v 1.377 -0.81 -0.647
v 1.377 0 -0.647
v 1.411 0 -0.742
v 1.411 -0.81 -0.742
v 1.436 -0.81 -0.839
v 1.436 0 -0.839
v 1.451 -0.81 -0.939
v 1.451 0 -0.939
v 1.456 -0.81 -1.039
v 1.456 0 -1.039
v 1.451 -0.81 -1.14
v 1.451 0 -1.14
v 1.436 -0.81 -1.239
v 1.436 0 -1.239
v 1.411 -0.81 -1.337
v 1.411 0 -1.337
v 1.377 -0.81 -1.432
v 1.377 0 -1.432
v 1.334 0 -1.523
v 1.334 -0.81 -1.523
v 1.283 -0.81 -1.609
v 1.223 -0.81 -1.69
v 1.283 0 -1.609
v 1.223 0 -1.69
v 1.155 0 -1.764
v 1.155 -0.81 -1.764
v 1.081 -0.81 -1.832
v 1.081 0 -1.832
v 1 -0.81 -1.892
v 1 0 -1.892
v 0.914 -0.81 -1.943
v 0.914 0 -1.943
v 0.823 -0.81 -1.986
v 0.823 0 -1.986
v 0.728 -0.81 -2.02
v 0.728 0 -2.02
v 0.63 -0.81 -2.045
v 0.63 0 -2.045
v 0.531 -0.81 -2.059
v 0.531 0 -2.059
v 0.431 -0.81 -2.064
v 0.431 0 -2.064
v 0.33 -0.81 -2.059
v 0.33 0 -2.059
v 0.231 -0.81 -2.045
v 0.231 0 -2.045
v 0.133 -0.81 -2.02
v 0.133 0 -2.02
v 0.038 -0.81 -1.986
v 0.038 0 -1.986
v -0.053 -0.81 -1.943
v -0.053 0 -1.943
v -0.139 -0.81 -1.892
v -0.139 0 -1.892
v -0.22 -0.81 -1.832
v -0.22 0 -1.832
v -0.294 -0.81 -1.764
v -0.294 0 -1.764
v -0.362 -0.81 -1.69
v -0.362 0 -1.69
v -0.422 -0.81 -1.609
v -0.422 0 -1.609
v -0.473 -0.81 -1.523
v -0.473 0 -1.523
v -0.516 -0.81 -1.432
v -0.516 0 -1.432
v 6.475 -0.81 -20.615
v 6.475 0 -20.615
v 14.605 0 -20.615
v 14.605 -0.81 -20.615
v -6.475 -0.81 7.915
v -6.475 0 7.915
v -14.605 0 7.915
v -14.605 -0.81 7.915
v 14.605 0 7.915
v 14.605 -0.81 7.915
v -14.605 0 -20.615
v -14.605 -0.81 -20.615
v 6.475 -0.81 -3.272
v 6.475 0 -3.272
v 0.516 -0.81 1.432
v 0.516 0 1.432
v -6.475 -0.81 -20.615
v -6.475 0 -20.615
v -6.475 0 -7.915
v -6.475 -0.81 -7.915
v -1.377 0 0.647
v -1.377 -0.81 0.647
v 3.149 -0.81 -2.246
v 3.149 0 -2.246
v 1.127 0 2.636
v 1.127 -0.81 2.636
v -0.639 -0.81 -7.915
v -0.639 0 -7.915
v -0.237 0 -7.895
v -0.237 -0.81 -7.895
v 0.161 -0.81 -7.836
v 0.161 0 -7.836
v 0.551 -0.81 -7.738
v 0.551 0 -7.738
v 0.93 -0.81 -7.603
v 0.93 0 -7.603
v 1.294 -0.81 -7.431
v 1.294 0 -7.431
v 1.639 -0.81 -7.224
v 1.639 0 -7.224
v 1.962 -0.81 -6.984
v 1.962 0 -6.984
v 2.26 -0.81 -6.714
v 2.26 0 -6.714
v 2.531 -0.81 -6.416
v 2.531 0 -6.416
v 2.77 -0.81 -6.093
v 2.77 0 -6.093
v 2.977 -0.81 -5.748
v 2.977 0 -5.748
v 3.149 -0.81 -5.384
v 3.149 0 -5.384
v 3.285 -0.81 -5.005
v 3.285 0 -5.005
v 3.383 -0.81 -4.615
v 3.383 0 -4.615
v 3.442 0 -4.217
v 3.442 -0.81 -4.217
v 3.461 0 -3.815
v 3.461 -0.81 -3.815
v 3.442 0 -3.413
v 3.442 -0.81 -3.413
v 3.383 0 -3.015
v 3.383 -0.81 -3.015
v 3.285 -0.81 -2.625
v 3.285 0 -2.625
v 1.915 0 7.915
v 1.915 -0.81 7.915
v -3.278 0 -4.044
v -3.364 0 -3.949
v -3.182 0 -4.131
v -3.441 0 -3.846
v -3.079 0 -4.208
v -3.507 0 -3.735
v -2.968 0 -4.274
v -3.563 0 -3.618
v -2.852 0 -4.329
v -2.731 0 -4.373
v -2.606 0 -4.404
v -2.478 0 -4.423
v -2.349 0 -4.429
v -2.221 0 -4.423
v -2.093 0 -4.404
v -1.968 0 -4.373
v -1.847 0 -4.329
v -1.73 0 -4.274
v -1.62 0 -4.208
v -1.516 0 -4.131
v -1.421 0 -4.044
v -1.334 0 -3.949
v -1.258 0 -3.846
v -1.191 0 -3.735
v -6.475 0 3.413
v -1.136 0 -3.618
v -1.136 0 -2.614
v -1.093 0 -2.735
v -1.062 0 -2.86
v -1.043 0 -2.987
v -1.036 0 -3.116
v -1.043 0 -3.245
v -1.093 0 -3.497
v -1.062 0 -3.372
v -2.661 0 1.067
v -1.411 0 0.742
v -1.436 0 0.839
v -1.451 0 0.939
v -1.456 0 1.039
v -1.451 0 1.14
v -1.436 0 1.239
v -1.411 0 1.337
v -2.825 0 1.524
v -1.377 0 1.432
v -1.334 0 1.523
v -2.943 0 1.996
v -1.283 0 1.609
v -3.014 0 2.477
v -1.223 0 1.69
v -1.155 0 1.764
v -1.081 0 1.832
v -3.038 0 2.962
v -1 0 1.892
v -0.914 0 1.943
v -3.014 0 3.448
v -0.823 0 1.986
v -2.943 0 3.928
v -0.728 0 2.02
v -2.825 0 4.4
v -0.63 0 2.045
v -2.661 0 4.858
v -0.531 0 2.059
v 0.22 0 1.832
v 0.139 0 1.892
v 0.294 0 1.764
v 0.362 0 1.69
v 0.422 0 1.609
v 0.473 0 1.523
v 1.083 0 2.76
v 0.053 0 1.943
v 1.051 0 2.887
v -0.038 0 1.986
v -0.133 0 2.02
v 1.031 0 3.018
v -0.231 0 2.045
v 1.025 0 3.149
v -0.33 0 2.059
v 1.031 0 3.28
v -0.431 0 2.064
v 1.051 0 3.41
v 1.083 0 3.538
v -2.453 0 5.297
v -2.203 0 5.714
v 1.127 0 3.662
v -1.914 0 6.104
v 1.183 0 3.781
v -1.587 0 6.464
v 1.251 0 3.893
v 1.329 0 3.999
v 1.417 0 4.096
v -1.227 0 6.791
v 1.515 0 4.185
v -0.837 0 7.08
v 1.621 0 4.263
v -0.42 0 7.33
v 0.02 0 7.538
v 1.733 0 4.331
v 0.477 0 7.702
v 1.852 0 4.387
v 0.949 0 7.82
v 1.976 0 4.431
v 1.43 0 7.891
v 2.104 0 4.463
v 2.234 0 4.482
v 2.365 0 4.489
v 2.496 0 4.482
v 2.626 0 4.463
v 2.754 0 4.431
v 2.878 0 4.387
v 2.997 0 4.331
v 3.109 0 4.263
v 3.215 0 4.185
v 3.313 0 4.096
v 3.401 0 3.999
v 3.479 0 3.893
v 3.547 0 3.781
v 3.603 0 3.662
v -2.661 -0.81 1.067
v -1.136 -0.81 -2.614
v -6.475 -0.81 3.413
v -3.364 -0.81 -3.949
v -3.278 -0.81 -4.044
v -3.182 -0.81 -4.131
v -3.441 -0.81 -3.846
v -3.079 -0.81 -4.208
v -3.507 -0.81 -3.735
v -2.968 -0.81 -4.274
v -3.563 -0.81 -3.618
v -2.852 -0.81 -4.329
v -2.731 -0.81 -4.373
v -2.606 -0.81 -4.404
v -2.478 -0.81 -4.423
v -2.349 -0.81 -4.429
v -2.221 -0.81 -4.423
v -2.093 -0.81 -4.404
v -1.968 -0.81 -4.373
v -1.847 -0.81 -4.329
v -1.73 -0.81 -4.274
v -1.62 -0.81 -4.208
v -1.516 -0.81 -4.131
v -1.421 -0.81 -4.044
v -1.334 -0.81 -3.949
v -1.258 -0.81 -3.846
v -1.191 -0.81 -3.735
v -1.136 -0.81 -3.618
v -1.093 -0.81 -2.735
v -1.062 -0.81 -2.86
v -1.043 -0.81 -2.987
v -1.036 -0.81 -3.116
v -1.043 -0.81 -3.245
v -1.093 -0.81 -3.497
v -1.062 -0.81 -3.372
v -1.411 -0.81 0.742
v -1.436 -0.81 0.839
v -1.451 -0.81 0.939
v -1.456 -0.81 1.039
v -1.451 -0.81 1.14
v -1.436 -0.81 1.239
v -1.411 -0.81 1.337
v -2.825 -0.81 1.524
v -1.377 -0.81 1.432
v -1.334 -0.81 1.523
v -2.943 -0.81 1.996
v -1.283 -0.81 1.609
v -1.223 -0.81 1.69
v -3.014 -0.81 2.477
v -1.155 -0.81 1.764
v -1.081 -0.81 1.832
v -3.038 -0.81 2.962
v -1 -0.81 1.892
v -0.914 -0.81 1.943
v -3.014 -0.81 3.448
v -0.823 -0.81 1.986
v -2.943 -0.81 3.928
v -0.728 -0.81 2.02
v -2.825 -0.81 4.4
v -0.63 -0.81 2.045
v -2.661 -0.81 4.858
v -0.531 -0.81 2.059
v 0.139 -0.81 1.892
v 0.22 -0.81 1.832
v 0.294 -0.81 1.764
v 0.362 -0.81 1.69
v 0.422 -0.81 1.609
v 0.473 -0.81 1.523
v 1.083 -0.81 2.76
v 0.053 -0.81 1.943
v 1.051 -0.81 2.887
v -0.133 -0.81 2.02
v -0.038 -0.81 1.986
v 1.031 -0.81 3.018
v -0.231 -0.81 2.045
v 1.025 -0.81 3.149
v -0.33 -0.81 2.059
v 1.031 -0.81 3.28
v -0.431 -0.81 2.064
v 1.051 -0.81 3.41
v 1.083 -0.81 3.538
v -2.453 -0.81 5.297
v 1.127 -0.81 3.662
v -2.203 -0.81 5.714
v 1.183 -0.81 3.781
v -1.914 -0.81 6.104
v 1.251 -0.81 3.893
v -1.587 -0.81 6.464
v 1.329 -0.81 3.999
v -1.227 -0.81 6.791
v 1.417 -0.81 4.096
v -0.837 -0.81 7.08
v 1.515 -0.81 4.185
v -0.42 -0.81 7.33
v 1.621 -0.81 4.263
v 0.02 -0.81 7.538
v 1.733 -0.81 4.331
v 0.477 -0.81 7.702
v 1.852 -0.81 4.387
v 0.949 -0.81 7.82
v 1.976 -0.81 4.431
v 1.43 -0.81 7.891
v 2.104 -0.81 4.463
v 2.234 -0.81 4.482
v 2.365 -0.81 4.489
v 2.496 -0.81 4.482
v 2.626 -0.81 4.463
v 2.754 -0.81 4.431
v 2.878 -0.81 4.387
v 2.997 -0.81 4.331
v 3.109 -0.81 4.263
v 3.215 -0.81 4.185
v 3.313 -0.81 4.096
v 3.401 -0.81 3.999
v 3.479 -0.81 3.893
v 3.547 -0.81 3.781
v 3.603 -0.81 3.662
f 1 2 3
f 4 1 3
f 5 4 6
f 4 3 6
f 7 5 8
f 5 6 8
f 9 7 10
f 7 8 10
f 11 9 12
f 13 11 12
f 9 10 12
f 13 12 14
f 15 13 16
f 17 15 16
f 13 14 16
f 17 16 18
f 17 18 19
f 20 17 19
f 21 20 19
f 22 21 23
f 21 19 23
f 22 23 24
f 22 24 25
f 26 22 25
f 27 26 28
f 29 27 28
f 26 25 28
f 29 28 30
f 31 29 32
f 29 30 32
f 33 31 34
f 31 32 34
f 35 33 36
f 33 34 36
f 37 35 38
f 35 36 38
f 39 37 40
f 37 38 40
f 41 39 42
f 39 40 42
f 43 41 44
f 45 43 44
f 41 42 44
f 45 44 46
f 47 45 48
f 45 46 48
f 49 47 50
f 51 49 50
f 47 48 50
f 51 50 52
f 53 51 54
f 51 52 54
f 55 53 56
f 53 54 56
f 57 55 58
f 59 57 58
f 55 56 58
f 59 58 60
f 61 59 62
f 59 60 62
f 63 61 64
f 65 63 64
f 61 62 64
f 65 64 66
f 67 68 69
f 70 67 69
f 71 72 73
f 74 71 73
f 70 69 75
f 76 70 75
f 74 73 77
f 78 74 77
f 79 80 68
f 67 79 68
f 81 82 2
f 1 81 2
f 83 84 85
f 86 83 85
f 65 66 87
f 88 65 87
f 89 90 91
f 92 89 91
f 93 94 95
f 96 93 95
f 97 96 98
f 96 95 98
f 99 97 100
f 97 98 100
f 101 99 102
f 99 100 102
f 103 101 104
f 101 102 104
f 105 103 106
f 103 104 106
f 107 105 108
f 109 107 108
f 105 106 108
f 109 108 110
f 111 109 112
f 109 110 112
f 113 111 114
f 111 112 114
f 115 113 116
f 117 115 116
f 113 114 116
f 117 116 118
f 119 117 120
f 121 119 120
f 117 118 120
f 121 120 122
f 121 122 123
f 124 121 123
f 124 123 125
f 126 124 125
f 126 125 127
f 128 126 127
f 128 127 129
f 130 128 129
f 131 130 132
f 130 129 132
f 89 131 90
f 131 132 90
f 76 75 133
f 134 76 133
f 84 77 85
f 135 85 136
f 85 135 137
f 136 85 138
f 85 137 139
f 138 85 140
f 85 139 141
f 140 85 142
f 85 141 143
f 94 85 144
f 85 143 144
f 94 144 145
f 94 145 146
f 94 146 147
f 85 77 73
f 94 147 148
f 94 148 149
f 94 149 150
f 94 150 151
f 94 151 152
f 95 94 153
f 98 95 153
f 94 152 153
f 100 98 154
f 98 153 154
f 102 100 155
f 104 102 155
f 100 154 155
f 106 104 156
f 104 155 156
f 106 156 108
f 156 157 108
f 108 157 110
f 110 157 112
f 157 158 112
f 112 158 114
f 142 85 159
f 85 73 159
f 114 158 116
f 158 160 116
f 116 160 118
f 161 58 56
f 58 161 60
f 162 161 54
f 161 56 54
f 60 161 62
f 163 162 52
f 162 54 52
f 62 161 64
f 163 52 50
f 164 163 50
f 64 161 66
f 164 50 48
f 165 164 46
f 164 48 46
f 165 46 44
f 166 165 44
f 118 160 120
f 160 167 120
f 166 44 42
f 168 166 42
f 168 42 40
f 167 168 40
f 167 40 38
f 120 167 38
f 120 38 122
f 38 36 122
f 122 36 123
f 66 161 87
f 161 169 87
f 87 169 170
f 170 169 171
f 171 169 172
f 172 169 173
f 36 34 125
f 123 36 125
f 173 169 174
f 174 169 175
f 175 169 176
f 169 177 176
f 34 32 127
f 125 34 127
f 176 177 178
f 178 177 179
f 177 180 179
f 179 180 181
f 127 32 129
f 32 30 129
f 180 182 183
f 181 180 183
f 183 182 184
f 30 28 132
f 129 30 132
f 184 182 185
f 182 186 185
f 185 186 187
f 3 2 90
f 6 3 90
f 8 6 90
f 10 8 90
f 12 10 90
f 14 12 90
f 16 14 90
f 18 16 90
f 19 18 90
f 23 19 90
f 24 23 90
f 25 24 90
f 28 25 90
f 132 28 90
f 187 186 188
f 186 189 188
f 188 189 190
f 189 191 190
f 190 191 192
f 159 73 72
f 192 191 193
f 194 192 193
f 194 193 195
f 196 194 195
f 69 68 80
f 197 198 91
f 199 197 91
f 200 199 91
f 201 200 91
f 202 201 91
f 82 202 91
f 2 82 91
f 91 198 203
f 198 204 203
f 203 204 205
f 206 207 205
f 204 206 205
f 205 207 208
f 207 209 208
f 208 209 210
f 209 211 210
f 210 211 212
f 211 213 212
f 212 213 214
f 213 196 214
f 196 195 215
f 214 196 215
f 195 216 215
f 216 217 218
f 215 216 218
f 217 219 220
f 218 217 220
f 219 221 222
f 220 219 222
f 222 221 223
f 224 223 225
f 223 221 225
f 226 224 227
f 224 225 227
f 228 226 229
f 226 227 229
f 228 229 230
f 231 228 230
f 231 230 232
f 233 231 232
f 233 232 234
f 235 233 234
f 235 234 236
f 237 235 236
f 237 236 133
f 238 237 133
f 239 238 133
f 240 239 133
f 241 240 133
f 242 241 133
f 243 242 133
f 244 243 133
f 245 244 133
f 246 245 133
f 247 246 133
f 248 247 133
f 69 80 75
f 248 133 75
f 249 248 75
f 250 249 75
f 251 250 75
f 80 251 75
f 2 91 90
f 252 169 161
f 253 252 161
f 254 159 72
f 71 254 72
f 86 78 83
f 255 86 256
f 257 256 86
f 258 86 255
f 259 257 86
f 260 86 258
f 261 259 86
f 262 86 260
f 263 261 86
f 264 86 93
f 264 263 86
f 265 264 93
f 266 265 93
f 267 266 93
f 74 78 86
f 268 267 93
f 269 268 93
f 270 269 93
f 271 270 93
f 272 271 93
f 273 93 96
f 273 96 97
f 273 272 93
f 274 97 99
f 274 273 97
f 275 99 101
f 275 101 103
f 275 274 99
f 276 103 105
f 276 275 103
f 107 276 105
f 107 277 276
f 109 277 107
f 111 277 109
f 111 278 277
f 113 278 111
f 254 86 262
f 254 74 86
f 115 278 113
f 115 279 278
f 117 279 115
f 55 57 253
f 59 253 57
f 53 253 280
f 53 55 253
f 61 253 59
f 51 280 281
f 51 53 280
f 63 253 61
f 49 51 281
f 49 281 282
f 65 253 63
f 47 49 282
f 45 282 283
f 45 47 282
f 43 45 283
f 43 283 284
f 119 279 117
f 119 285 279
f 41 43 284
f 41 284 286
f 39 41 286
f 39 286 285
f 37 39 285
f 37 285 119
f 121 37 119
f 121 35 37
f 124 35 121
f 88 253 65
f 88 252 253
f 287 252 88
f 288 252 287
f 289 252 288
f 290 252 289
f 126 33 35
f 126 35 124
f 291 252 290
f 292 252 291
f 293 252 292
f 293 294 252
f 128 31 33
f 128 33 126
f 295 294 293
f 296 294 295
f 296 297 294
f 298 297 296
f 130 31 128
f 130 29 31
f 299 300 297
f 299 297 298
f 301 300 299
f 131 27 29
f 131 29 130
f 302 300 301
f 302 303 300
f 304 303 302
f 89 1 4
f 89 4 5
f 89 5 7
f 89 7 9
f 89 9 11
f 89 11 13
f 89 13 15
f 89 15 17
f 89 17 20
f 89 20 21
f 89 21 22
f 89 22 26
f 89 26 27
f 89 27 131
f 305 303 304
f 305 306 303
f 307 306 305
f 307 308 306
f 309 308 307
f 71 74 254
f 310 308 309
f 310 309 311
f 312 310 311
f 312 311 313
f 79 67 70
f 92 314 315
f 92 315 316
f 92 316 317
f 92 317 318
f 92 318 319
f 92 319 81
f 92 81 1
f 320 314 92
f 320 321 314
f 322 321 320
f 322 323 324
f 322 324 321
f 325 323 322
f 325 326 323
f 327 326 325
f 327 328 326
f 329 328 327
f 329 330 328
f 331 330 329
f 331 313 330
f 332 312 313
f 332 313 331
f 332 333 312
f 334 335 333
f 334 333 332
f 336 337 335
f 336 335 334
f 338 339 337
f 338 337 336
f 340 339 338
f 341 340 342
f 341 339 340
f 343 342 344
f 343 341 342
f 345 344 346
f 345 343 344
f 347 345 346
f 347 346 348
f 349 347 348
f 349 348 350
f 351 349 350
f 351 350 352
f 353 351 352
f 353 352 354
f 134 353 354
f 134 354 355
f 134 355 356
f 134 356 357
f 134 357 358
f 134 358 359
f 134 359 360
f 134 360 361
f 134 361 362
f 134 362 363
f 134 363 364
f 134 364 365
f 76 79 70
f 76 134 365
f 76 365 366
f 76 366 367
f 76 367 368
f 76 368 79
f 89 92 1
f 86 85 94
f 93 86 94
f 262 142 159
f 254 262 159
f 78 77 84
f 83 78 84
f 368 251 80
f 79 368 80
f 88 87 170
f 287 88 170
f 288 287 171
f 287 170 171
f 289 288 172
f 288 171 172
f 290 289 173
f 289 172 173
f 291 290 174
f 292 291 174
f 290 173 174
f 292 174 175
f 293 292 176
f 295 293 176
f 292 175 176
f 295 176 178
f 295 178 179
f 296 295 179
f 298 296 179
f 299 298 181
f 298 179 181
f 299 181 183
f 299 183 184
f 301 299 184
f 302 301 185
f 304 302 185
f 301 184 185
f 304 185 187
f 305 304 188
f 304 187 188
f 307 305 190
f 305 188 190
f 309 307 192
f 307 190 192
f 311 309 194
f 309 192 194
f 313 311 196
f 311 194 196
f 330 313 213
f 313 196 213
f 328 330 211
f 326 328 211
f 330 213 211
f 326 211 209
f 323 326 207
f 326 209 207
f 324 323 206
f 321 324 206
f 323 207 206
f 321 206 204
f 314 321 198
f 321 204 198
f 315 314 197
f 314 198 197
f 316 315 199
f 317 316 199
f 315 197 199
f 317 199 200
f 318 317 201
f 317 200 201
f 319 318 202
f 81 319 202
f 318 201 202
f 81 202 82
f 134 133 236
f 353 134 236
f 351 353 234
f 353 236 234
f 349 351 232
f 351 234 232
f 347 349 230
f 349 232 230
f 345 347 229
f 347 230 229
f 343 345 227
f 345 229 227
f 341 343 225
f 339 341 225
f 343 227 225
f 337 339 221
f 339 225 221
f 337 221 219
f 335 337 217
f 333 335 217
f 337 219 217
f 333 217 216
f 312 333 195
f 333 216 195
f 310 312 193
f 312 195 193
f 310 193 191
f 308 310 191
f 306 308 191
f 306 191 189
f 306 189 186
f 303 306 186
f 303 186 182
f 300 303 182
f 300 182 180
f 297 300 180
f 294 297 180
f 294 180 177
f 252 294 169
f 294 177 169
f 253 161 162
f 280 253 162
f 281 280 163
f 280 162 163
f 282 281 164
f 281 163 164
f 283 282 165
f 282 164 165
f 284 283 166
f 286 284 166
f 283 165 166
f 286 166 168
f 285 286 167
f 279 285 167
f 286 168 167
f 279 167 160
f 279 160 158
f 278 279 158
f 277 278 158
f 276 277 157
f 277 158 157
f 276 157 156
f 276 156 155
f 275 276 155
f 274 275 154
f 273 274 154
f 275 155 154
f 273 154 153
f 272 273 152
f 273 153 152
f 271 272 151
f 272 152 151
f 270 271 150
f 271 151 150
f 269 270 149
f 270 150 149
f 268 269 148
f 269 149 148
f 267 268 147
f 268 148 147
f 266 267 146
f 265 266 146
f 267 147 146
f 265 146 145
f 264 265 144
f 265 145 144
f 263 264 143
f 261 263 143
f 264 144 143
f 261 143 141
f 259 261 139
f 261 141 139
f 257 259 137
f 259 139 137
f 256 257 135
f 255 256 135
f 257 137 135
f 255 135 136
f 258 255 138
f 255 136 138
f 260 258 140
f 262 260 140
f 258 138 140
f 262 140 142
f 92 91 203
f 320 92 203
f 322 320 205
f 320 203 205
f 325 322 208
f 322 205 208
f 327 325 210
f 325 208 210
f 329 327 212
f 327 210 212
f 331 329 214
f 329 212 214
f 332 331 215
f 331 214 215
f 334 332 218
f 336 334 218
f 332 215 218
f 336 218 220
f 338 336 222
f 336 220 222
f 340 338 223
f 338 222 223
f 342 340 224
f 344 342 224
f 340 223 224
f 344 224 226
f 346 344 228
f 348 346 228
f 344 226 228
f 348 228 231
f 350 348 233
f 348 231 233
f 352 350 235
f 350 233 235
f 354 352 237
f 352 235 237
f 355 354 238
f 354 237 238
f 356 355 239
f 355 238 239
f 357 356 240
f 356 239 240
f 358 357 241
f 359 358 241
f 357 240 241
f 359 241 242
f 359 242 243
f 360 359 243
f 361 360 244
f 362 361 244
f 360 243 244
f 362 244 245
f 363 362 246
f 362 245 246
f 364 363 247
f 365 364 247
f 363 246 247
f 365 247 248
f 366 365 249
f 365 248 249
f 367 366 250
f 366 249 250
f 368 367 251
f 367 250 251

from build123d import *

# Parameters (mm, degrees)
F1_DEPTH = 0.81


with BuildPart() as f1:
    # F0 (on Front) → F1 (new body)
    with BuildSketch(Plane.XZ):
        with BuildLine():
            Line((-6.475, 3.412853), (-6.475, 7.915))
            Line((-6.475, 7.915), (-14.605, 7.915))
            Line((-14.605, 7.915), (-14.605, -7.915))
            Line((-14.605, -7.915), (-14.605, -20.615))
            Line((-14.605, -20.615), (-6.475, -20.615))
            Line((-6.475, -20.615), (-6.475, -7.915))
            Line((-6.475, -7.915), (-0.638679, -7.915))
            ThreePointArc((-0.638679, -7.915), (2.770346, -6.092838), (3.149227, -2.245998))
            Line((3.149227, -2.245998), (1.127017, 2.636048))
            ThreePointArc((1.127017, 2.636048), (1.85222, 4.386842), (3.603014, 3.661639))
            Line((3.603014, 3.661639), (6.475, -3.271947))
            Line((6.475, -3.271947), (6.475, -7.915))
            Line((6.475, -7.915), (6.475, -20.615))
            Line((6.475, -20.615), (14.605, -20.615))
            Line((14.605, -20.615), (14.605, -7.915))
            Line((14.605, -7.915), (14.605, 7.915))
            Line((14.605, 7.915), (6.475, 7.915))
            Line((6.475, 7.915), (1.915, 7.915))
            ThreePointArc((1.915, 7.915), (-2.203111, 5.713824), (-2.6608, 1.066831))
            Line((-2.6608, 1.066831), (-1.13634, -2.613541))
            ThreePointArc((-1.13634, -2.613541), (-1.846951, -4.329109), (-3.562519, -3.618498))
            Line((-3.562519, -3.618498), (-6.475, 3.412853))
        make_face()
        with BuildLine():
            Line((-0.516458, -1.431615), (-1.377495, 0.647114))
            ThreePointArc((-1.377495, 0.647114), (-0.822769, 1.986341), (0.516458, 1.431615))
            Line((0.516458, 1.431615), (1.377495, -0.647114))
            ThreePointArc((1.377495, -0.647114), (0.822769, -1.986341), (-0.516458, -1.431615))
        make_face(mode=Mode.SUBTRACT)
    extrude(amount=F1_DEPTH)


solid = f1.part
